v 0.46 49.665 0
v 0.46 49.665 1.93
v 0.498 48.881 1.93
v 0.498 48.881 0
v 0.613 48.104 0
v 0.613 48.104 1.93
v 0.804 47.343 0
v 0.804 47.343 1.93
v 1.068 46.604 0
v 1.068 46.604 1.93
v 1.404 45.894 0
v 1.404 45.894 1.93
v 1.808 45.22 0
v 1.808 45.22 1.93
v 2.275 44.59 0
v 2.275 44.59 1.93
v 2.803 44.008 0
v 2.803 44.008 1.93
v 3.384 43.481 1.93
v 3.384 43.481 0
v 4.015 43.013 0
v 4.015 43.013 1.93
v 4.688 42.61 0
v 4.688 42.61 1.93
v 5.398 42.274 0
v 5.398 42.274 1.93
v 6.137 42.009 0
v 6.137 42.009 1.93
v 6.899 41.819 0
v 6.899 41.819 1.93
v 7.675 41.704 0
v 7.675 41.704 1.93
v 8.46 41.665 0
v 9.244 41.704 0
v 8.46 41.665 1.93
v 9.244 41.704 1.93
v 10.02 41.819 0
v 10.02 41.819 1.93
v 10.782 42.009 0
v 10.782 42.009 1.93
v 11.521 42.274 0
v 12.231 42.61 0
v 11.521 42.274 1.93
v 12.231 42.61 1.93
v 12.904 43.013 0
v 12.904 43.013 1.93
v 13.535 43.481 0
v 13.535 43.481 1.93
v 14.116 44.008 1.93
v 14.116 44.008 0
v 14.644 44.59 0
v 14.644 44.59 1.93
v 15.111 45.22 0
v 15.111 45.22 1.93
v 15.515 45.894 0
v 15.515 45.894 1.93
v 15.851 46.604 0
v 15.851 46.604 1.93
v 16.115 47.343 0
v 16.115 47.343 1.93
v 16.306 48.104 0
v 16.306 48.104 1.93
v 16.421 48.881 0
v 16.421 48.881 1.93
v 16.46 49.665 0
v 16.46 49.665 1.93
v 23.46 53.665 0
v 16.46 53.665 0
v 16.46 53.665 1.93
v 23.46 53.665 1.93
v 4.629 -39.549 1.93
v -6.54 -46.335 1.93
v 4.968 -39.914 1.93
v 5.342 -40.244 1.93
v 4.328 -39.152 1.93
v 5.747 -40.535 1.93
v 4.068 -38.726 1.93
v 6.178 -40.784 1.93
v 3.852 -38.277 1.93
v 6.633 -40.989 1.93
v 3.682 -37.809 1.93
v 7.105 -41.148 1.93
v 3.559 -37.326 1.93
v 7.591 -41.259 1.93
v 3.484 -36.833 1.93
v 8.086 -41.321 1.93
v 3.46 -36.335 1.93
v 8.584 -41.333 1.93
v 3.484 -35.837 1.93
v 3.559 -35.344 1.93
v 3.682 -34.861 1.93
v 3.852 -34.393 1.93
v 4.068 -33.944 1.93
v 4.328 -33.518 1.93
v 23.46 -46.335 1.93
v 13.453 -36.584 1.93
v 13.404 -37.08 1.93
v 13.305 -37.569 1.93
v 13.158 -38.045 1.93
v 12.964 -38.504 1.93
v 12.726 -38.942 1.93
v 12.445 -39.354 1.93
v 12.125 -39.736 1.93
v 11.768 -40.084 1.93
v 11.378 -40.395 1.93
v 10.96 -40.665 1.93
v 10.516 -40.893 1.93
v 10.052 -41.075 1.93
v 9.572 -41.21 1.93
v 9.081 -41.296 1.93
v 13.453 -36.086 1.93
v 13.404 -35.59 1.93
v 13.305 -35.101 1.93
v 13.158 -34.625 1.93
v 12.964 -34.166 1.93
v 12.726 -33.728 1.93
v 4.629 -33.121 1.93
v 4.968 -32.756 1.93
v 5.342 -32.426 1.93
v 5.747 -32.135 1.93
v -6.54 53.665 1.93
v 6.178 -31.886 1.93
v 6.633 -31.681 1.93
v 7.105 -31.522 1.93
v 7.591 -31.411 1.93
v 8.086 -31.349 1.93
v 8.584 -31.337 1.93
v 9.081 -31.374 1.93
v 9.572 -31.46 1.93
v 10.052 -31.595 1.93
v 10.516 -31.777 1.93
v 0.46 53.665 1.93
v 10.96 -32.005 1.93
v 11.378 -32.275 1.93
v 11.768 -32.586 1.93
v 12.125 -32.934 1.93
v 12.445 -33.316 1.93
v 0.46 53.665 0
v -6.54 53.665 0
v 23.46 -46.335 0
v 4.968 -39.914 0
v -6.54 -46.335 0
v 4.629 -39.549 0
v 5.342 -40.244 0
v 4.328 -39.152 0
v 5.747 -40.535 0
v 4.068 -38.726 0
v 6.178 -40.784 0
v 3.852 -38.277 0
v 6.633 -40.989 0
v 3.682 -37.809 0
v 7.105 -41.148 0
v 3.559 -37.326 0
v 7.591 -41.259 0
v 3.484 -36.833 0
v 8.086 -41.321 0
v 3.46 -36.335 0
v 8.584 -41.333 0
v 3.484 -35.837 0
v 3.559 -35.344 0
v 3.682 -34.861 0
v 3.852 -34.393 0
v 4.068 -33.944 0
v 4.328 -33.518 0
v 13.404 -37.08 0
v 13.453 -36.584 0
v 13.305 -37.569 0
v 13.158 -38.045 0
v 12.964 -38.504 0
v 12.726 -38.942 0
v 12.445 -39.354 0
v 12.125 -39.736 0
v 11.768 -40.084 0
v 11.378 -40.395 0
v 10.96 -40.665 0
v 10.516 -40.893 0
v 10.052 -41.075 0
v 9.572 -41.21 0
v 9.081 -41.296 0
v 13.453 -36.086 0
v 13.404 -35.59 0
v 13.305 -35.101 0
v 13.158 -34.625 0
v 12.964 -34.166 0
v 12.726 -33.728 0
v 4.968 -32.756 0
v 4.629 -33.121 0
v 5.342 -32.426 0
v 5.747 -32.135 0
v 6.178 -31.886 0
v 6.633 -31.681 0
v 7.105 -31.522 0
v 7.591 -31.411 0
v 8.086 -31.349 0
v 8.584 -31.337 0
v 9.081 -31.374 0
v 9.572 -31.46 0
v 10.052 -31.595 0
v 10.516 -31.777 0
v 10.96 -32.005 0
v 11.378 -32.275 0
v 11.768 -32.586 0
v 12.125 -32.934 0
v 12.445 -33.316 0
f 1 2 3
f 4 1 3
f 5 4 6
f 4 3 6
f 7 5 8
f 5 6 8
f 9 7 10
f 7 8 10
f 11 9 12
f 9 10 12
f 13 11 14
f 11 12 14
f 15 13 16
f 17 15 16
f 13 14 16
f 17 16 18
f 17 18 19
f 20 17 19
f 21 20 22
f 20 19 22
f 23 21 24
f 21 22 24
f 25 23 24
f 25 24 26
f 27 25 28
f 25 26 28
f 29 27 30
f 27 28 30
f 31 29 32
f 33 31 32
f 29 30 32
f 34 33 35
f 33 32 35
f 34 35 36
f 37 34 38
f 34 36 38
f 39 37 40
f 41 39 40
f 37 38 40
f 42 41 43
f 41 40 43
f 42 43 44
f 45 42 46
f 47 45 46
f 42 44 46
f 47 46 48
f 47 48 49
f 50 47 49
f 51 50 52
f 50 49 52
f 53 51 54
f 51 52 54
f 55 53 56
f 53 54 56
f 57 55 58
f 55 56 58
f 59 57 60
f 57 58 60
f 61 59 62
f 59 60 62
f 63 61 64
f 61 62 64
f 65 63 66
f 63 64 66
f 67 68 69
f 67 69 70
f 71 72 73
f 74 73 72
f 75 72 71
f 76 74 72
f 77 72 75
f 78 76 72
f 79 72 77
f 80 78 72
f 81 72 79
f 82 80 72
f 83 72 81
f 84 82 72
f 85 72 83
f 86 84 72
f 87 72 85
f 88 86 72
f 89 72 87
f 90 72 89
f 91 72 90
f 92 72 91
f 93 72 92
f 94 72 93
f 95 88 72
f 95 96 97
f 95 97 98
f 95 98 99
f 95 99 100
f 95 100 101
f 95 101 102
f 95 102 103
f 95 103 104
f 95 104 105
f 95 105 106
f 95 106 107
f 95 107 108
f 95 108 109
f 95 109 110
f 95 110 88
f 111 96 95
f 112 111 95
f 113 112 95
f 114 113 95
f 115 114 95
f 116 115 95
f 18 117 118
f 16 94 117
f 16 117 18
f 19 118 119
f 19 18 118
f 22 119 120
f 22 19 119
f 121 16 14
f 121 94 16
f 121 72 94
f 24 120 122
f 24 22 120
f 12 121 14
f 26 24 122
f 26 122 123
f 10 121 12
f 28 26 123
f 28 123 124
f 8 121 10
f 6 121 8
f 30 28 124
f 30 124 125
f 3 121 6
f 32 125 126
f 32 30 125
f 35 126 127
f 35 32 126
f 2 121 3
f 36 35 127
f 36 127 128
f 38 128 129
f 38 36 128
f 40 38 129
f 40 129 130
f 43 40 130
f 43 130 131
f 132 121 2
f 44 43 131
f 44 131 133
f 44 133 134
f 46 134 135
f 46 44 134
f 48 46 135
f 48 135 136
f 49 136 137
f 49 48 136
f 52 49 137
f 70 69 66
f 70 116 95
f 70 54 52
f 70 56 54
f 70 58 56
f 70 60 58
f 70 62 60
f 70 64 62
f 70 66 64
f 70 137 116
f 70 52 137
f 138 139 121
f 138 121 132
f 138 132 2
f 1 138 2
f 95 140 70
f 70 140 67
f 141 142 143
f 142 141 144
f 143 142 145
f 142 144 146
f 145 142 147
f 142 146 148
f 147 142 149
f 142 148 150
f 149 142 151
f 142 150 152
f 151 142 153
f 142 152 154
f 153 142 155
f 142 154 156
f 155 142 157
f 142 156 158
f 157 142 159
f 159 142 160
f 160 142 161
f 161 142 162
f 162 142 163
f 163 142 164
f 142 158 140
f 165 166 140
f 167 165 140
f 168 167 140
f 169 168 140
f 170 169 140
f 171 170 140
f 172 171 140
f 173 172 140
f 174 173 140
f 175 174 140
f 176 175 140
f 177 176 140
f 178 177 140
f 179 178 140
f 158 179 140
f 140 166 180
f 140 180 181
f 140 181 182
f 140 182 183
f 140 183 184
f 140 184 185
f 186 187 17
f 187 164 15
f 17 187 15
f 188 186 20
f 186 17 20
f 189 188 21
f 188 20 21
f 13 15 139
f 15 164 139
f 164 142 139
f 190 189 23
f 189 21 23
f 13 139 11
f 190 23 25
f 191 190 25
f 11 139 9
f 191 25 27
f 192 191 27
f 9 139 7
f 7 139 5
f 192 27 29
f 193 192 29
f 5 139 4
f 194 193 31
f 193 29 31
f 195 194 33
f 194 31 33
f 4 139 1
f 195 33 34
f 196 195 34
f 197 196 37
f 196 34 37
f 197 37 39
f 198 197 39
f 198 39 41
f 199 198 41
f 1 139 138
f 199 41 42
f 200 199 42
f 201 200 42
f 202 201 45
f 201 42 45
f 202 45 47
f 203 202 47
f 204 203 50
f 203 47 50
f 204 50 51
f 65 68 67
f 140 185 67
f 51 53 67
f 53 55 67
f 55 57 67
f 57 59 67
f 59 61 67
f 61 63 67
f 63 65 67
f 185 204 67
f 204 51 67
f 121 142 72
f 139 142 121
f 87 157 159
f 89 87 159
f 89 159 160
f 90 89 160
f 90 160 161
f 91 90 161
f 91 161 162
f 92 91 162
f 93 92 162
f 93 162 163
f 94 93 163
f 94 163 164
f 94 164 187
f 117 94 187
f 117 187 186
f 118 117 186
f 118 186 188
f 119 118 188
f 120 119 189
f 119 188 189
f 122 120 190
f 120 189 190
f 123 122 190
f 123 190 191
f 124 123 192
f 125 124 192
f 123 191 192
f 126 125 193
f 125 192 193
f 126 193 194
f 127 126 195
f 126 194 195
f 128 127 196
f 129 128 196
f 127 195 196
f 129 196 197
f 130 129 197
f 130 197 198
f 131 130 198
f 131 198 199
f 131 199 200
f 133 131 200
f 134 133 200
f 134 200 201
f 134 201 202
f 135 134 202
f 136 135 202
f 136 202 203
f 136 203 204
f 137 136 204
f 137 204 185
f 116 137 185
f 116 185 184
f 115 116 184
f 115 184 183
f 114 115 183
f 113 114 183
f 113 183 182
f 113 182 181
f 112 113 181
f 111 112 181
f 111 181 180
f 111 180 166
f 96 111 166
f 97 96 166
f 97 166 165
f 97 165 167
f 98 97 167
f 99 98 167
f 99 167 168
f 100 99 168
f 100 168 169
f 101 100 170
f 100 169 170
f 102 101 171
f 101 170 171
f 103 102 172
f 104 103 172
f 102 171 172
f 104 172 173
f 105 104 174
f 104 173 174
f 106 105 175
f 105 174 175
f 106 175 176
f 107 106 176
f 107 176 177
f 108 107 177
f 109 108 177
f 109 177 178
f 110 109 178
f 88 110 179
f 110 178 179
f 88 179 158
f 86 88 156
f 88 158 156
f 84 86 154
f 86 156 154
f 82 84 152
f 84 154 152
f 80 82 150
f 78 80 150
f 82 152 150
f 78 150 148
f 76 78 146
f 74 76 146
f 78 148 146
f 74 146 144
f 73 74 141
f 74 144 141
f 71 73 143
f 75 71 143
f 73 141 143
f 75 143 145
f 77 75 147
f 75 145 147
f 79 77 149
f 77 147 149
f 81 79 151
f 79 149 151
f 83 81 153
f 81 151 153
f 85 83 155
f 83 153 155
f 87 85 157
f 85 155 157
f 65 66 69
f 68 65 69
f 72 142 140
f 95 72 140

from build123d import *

# Parameters (mm, degrees)
F0_W     = 30
F0_H     = 100
F1_DEPTH = 1.93
F3_D     = 10
F4_DEPTH = 1.93


# Not quite as in the source:
# - a feature names something its author has since deleted; it is built from what else it names


with BuildPart() as f1:
    # F0 (on Top) → F1 (new body)
    with BuildSketch(Plane.XY):
        with Locations((8.4595183283, 3.6650180817)):
            Rectangle(F0_W, F0_H)
    extrude(amount=F1_DEPTH)

    # F3 (through all)
    with Locations(Plane.XY.offset(1.93)):
        with Locations((8.4595183283, -36.3349819183)):
            Hole(F3_D / 2)

    # F2 (on face) → F4 (cut)
    with BuildSketch(Plane.XY.offset(1.93)):
        with BuildLine():
            Line((0.4595183283, 53.6650180817), (0.4595183283, 49.6650180817))
            ThreePointArc((0.4595183283, 49.6650180817), (8.4595183283, 41.6650180817), (16.4595183283, 49.6650180817))
            Line((16.4595183283, 49.6650180817), (16.4595183283, 53.6650180817))
            Line((16.4595183283, 53.6650180817), (0.4595183283, 53.6650180817))
        make_face()
    extrude(amount=-F4_DEPTH, mode=Mode.SUBTRACT)


solid = f1.part
